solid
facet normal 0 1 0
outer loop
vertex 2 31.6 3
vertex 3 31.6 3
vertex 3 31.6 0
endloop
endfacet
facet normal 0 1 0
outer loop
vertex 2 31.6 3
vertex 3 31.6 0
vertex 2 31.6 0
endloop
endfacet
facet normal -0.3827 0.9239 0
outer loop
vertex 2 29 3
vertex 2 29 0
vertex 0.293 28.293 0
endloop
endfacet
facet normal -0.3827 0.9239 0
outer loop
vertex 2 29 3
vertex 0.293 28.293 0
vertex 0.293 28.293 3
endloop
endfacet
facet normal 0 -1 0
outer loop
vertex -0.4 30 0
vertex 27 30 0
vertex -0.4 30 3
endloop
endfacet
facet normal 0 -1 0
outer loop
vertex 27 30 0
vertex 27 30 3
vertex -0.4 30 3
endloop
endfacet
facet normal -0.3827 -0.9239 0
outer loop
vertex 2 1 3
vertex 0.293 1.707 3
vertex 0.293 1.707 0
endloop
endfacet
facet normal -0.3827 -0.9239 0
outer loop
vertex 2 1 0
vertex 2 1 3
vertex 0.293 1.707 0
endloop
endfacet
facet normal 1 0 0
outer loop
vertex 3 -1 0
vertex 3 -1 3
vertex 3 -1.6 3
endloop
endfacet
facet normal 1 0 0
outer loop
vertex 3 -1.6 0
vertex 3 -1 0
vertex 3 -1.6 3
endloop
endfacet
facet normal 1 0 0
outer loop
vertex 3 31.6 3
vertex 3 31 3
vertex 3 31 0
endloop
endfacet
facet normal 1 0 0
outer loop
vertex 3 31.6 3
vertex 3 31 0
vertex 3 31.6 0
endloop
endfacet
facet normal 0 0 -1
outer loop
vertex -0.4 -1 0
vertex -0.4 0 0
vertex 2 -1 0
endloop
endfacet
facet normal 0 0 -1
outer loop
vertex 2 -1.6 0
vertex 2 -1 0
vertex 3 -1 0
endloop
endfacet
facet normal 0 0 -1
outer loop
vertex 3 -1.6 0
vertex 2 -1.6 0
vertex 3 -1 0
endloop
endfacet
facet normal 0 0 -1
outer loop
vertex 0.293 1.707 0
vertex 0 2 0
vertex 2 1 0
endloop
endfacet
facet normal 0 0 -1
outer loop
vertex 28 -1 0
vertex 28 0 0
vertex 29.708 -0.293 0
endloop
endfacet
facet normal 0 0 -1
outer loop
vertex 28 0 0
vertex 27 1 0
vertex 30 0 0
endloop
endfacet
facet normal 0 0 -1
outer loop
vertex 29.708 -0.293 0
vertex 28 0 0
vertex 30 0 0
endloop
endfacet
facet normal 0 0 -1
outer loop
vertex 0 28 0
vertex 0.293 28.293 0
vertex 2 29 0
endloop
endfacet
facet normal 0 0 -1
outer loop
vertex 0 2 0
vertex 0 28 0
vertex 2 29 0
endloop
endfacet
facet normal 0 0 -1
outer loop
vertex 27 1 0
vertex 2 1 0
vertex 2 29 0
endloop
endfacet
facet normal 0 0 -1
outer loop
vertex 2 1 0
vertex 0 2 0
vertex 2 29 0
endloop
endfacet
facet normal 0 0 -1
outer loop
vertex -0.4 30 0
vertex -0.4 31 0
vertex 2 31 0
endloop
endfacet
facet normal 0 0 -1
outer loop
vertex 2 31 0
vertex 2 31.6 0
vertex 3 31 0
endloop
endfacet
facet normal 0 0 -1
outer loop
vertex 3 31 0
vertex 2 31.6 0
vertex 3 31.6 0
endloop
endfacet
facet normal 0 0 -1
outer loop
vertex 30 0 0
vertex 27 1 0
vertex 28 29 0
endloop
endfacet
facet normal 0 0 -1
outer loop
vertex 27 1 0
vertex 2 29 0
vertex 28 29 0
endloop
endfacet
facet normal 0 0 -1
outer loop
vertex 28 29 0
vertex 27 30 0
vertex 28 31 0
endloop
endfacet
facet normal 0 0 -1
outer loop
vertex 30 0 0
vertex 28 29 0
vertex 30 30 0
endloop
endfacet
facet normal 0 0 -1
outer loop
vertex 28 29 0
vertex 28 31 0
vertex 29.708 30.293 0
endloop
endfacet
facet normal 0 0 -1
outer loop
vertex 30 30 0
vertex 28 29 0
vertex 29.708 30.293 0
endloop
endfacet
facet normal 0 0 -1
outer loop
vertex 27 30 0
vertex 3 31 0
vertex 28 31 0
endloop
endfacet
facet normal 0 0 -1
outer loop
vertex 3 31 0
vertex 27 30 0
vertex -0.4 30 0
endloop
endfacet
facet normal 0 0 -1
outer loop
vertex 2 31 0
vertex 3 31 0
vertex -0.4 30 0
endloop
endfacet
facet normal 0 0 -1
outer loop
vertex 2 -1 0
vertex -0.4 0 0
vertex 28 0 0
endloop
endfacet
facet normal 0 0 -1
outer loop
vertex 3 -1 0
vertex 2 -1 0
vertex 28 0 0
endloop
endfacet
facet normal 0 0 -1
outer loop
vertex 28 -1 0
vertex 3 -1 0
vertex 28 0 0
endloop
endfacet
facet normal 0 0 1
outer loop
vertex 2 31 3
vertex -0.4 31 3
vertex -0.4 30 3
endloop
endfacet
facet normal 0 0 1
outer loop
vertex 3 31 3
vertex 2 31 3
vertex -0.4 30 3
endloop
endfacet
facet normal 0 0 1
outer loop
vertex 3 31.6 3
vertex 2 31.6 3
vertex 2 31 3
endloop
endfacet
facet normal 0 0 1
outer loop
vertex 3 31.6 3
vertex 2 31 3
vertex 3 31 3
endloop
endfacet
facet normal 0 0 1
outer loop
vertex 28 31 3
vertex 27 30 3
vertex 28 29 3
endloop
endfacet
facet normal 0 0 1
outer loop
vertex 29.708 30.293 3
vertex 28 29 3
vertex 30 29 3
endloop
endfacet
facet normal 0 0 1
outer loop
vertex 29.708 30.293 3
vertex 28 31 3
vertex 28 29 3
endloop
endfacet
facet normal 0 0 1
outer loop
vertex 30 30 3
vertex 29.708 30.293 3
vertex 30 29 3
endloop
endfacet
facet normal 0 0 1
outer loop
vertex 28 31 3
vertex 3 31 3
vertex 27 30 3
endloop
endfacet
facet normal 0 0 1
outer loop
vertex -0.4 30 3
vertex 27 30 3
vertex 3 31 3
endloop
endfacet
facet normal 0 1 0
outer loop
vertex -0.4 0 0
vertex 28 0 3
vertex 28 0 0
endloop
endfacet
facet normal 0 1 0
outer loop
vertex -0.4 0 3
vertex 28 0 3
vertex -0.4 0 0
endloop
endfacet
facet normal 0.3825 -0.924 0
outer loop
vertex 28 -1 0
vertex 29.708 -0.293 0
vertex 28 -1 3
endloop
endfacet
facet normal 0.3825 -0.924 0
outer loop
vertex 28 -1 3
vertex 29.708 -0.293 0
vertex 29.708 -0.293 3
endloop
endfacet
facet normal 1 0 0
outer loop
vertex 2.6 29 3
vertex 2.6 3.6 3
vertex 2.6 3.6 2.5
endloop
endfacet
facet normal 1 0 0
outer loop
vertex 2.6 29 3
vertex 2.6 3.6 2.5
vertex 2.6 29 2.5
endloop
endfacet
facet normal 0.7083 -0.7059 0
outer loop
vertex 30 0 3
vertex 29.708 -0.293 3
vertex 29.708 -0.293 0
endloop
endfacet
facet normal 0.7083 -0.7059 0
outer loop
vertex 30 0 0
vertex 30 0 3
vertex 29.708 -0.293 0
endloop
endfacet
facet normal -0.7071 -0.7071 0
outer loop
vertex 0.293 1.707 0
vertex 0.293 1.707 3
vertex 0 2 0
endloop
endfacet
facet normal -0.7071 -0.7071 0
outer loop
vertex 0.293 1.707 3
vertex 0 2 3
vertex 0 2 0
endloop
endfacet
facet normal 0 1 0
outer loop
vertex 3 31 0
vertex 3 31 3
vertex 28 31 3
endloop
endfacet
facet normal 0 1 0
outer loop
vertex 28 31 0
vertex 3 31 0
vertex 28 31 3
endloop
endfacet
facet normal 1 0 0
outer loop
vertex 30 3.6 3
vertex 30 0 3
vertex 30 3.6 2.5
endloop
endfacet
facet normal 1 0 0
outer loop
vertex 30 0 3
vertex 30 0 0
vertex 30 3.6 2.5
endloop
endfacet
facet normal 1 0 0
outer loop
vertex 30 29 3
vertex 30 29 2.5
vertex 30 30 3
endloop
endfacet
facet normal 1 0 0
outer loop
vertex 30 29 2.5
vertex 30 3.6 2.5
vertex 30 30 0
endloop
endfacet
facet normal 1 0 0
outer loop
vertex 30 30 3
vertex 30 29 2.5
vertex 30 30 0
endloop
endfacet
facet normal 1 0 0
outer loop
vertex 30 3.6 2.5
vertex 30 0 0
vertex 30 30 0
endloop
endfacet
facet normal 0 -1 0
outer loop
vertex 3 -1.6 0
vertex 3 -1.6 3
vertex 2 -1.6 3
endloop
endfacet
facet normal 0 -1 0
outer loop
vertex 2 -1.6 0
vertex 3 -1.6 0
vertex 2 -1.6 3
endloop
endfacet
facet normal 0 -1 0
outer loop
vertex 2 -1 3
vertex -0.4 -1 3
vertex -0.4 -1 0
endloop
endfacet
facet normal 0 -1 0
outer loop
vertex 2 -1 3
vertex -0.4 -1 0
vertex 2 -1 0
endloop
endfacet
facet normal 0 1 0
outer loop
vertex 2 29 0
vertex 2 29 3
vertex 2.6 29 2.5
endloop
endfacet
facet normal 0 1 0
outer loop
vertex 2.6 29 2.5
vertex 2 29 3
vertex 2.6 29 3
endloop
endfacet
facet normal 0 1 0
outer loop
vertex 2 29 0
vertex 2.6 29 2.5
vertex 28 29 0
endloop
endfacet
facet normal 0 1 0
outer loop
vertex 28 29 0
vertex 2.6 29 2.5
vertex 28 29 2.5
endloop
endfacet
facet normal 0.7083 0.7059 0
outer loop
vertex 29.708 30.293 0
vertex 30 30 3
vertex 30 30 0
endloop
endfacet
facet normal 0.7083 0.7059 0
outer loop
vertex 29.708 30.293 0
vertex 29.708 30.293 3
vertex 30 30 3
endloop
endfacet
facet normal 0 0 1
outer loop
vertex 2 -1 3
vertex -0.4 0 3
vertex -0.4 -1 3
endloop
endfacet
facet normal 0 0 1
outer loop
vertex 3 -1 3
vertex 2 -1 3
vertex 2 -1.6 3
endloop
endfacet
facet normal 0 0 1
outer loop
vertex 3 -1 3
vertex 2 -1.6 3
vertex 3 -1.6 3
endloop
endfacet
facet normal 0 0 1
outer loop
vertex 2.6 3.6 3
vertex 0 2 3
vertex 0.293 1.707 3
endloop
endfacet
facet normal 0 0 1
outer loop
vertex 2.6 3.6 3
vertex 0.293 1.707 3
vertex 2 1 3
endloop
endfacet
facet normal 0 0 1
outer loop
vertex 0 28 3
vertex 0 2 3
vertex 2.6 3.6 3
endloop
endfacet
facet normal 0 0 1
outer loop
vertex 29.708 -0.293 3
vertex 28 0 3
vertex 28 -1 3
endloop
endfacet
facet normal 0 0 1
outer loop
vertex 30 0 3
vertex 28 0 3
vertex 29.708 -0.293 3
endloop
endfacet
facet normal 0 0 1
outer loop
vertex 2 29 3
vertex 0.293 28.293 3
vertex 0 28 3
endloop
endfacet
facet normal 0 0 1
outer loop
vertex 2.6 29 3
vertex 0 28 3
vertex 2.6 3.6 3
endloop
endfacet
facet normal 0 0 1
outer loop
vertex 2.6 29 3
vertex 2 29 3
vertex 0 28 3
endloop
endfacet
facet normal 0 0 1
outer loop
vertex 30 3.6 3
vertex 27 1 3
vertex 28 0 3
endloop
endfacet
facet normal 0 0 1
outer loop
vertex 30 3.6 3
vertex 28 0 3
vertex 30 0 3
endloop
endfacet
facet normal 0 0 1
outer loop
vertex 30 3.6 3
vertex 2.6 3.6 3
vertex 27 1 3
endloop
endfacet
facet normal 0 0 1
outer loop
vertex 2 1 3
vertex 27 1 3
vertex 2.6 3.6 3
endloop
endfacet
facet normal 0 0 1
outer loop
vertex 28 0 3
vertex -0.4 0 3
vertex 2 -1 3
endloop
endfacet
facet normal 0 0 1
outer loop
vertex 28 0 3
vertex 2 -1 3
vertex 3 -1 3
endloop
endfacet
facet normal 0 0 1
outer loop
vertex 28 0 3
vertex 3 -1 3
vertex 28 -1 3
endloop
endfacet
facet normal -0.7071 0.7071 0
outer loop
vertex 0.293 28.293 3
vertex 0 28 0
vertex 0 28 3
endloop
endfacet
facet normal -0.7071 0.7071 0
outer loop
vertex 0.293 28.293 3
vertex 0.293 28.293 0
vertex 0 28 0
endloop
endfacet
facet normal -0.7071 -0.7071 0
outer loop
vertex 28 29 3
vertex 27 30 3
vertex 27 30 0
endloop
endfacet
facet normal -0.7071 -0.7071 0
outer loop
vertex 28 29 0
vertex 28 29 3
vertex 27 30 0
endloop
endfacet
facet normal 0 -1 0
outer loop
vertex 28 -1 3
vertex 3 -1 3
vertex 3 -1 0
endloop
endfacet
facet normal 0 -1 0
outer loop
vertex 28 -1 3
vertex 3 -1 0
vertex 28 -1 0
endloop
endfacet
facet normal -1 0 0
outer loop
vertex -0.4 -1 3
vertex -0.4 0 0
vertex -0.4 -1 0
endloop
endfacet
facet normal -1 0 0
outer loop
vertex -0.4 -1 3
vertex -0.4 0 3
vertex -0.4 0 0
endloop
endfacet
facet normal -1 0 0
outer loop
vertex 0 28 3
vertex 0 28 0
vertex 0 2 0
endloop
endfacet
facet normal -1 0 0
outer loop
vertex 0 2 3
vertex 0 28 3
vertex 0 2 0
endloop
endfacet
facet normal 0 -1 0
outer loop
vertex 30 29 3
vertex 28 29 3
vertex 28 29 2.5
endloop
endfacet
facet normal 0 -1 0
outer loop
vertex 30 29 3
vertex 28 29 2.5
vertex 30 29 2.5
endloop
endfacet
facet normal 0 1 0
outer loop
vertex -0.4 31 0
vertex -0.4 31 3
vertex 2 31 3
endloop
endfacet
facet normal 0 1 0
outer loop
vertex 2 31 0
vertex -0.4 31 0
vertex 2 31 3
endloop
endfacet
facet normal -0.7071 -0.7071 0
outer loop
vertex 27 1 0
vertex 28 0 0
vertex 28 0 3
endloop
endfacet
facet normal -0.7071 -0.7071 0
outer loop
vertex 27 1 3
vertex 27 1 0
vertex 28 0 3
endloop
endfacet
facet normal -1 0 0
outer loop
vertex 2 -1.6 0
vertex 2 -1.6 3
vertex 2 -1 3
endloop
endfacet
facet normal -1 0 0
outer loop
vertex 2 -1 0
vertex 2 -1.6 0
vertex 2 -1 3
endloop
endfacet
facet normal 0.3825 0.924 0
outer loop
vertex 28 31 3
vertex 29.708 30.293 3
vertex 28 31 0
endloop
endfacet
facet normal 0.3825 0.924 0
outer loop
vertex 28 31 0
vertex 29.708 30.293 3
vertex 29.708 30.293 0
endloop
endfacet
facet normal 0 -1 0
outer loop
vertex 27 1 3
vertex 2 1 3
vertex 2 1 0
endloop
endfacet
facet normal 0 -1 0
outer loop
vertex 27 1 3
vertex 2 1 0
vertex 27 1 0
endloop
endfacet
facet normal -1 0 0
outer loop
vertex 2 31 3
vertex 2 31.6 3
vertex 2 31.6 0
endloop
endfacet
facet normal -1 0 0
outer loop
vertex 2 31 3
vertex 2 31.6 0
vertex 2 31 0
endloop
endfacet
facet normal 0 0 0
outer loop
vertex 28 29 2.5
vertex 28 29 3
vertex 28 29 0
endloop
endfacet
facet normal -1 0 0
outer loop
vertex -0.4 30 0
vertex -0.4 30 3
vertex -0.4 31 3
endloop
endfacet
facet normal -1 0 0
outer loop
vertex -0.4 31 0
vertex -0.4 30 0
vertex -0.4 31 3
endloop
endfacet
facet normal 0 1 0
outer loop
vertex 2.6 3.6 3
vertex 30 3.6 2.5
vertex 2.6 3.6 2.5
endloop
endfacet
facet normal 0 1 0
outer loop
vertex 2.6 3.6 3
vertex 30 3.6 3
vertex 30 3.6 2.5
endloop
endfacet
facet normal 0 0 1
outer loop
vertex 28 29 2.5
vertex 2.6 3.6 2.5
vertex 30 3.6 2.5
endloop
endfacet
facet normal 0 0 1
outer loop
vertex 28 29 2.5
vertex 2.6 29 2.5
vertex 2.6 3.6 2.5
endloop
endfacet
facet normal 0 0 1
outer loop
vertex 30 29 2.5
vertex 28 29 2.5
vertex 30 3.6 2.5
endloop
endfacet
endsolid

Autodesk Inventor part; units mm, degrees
ref_plane "YZ Plane" through (0, 0, 0) normal (1, 0, 0) x (0, 1, 0)
ref_plane "XZ Plane" through (0, 0, 0) normal (0, 1, 0) x (-1, 0, 0)
ref_plane "XY Plane" through (0, 0, 0) normal (0, 0, 1) x (1, 0, 0)
sketch "Sketch1" plane through (0, 0, 0) normal (0, 0, 1) x (1, 0, 0)
  line L0 (0, 0) -> (30, 0)
  line L1 (30, 0) -> (30, 30)
  line L2 (30, 30) -> (0, 30)
  line L3 (0, 30) -> (0, 0)
  dimension "d0" = 30
  dimension "d1" = 30
extrude "Extrusion1" add sketch "Sketch1" along normal blind 3
sketch "Sketch2" plane through (0, 0, 3) normal (0, 0, 1) x (1, 0, 0)
  line L0 (30, 3.6) -> (2.6, 3.6)
  line L1 (2.6, 3.6) -> (2.6, 29)
  line L2 (2.6, 29) -> (30, 29)
  line L3 (30, 29) -> (30, 3.6)
  line L4 (0, 0) -> (30, 0) projected
  line L5 (30, 0) -> (30, 30) projected
  dimension "d4" = 27.4
  dimension "d5" = 25.4
  dimension "d36" = 3.6
extrude "Extrusion2" cut sketch "Sketch2" against normal blind 0.5
sketch "Sketch3" plane through (0, 0, 3) normal (0, 0, 1) x (1, 0, 0)
  line L0 (30, 30) -> (0, 30) projected
  line L1 (0, 30) -> (0, 0) projected
  line L2 (28, 30) -> (0, 30)
  line L3 (0, 30) -> (0, 29)
  line L4 (0, 29) -> (28, 29)
  line L5 (28, 29) -> (28, 30)
  line L6 (30, 29) -> (30, 30) projected
  line L7 (0, 0) -> (30, 0) projected
  line L8 (28, 0) -> (0, 0)
  line L9 (0, 0) -> (0, 1)
  line L10 (0, 1) -> (28, 1)
  line L11 (28, 1) -> (28, 0)
  line L12 (30, 0) -> (30, 3.6) projected
  dimension "d8" = 1
  dimension "d9" = 2
  dimension "d10" = 1
  dimension "d11" = 2
extrude "Extrusion3" cut sketch "Sketch3" against normal through all
sketch "Sketch4" plane through (0, 0, 3) normal (0, 0, 1) x (1, 0, 0)
  line L0 (30, 29) -> (30, 30) projected
  line L1 (30, 30) -> (-0.4, 30)
  line L2 (-0.4, 30) -> (-0.4, 31)
  line L3 (-0.4, 31) -> (30, 31)
  line L4 (30, 31) -> (30, 30)
  line L5 (30, 0) -> (-0.4, 0)
  line L6 (-0.4, 0) -> (-0.4, -1)
  line L7 (-0.4, -1) -> (30, -1)
  line L8 (30, -1) -> (30, 0)
  line L9 (2, 31) -> (3, 31)
  line L10 (3, 31) -> (3, 31.6)
  line L11 (3, 31.6) -> (2, 31.6)
  line L12 (2, 31.6) -> (2, 31)
  line L13 (2, -1) -> (3, -1)
  line L14 (3, -1) -> (3, -1.6)
  line L15 (3, -1.6) -> (2, -1.6)
  line L16 (2, -1.6) -> (2, -1)
  line L17 (0, 29) -> (0, 1) projected
  point P0 (0, 0)
  dimension "d14" = 30.4
  dimension "d15" = 1
  dimension "d17" = 1
  dimension "d20" = 1
  dimension "d21" = 0.6
  dimension "d26" = 1
  dimension "d27" = 0.6
  dimension "d35" = 2
extrude "Extrusion4" add sketch "Sketch4" against normal blind 3
chamfer "Chamfer1" distance 1 angle 45 4 edges at (30, 31, 1.5) (30, -1, 1.5) (28, 1, 1.5) (28, 30, 1.5)
chamfer "Chamfer2" distance 1 angle 45 2 edges at (29.0005, 31, 1.5) (29.0005, -1, 1.5)
chamfer "Chamfer3" distance 1 angle 45 2 edges at (0, 29, 1.5) (0, 1, 1.5)
chamfer "Chamfer4" distance 1 angle 45 2 edges at (1, 29, 1.5) (1, 1, 1.5)
properties part number "TA10" material "ABS Plastic"
